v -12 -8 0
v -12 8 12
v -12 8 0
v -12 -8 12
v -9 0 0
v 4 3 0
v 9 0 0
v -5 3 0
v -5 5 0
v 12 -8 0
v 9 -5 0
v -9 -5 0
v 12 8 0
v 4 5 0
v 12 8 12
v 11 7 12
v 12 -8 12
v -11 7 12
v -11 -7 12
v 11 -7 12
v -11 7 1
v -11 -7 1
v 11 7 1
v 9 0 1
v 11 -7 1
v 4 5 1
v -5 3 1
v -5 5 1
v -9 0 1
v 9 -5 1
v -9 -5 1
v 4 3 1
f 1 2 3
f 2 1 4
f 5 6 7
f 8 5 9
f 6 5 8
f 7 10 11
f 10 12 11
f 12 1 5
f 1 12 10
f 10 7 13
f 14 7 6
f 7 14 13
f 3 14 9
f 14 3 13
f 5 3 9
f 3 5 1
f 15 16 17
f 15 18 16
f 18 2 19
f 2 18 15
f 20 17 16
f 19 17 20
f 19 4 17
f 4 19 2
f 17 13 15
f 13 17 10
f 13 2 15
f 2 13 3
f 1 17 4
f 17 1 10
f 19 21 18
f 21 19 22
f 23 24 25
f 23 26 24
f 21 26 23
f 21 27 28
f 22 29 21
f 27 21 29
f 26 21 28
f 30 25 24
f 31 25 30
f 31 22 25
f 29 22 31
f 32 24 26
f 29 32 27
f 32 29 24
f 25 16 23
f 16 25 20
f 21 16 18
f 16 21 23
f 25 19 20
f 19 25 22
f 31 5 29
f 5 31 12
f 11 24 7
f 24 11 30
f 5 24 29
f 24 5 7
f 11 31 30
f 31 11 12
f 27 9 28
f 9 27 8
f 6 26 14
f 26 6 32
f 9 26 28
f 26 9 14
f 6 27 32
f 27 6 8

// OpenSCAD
male_dim = [18, 5, 8];
switch_dim = [9, 2, 5];
box = [24, 16, 12];
box_cutout = [22, 14, 16];

// Remove overhang by making it the bottom part
rotate([0, 180, 0]) {
	// Put in the middle of the axis
	translate([-12, -8, -12]) {
		difference() {
			cube(box);
			translate([1, 1, -5]) cube(box_cutout);
			translate([3, 3, 5]) cube(male_dim);
			translate([8, 11, 8]) cube(switch_dim);
		}
	}
}
